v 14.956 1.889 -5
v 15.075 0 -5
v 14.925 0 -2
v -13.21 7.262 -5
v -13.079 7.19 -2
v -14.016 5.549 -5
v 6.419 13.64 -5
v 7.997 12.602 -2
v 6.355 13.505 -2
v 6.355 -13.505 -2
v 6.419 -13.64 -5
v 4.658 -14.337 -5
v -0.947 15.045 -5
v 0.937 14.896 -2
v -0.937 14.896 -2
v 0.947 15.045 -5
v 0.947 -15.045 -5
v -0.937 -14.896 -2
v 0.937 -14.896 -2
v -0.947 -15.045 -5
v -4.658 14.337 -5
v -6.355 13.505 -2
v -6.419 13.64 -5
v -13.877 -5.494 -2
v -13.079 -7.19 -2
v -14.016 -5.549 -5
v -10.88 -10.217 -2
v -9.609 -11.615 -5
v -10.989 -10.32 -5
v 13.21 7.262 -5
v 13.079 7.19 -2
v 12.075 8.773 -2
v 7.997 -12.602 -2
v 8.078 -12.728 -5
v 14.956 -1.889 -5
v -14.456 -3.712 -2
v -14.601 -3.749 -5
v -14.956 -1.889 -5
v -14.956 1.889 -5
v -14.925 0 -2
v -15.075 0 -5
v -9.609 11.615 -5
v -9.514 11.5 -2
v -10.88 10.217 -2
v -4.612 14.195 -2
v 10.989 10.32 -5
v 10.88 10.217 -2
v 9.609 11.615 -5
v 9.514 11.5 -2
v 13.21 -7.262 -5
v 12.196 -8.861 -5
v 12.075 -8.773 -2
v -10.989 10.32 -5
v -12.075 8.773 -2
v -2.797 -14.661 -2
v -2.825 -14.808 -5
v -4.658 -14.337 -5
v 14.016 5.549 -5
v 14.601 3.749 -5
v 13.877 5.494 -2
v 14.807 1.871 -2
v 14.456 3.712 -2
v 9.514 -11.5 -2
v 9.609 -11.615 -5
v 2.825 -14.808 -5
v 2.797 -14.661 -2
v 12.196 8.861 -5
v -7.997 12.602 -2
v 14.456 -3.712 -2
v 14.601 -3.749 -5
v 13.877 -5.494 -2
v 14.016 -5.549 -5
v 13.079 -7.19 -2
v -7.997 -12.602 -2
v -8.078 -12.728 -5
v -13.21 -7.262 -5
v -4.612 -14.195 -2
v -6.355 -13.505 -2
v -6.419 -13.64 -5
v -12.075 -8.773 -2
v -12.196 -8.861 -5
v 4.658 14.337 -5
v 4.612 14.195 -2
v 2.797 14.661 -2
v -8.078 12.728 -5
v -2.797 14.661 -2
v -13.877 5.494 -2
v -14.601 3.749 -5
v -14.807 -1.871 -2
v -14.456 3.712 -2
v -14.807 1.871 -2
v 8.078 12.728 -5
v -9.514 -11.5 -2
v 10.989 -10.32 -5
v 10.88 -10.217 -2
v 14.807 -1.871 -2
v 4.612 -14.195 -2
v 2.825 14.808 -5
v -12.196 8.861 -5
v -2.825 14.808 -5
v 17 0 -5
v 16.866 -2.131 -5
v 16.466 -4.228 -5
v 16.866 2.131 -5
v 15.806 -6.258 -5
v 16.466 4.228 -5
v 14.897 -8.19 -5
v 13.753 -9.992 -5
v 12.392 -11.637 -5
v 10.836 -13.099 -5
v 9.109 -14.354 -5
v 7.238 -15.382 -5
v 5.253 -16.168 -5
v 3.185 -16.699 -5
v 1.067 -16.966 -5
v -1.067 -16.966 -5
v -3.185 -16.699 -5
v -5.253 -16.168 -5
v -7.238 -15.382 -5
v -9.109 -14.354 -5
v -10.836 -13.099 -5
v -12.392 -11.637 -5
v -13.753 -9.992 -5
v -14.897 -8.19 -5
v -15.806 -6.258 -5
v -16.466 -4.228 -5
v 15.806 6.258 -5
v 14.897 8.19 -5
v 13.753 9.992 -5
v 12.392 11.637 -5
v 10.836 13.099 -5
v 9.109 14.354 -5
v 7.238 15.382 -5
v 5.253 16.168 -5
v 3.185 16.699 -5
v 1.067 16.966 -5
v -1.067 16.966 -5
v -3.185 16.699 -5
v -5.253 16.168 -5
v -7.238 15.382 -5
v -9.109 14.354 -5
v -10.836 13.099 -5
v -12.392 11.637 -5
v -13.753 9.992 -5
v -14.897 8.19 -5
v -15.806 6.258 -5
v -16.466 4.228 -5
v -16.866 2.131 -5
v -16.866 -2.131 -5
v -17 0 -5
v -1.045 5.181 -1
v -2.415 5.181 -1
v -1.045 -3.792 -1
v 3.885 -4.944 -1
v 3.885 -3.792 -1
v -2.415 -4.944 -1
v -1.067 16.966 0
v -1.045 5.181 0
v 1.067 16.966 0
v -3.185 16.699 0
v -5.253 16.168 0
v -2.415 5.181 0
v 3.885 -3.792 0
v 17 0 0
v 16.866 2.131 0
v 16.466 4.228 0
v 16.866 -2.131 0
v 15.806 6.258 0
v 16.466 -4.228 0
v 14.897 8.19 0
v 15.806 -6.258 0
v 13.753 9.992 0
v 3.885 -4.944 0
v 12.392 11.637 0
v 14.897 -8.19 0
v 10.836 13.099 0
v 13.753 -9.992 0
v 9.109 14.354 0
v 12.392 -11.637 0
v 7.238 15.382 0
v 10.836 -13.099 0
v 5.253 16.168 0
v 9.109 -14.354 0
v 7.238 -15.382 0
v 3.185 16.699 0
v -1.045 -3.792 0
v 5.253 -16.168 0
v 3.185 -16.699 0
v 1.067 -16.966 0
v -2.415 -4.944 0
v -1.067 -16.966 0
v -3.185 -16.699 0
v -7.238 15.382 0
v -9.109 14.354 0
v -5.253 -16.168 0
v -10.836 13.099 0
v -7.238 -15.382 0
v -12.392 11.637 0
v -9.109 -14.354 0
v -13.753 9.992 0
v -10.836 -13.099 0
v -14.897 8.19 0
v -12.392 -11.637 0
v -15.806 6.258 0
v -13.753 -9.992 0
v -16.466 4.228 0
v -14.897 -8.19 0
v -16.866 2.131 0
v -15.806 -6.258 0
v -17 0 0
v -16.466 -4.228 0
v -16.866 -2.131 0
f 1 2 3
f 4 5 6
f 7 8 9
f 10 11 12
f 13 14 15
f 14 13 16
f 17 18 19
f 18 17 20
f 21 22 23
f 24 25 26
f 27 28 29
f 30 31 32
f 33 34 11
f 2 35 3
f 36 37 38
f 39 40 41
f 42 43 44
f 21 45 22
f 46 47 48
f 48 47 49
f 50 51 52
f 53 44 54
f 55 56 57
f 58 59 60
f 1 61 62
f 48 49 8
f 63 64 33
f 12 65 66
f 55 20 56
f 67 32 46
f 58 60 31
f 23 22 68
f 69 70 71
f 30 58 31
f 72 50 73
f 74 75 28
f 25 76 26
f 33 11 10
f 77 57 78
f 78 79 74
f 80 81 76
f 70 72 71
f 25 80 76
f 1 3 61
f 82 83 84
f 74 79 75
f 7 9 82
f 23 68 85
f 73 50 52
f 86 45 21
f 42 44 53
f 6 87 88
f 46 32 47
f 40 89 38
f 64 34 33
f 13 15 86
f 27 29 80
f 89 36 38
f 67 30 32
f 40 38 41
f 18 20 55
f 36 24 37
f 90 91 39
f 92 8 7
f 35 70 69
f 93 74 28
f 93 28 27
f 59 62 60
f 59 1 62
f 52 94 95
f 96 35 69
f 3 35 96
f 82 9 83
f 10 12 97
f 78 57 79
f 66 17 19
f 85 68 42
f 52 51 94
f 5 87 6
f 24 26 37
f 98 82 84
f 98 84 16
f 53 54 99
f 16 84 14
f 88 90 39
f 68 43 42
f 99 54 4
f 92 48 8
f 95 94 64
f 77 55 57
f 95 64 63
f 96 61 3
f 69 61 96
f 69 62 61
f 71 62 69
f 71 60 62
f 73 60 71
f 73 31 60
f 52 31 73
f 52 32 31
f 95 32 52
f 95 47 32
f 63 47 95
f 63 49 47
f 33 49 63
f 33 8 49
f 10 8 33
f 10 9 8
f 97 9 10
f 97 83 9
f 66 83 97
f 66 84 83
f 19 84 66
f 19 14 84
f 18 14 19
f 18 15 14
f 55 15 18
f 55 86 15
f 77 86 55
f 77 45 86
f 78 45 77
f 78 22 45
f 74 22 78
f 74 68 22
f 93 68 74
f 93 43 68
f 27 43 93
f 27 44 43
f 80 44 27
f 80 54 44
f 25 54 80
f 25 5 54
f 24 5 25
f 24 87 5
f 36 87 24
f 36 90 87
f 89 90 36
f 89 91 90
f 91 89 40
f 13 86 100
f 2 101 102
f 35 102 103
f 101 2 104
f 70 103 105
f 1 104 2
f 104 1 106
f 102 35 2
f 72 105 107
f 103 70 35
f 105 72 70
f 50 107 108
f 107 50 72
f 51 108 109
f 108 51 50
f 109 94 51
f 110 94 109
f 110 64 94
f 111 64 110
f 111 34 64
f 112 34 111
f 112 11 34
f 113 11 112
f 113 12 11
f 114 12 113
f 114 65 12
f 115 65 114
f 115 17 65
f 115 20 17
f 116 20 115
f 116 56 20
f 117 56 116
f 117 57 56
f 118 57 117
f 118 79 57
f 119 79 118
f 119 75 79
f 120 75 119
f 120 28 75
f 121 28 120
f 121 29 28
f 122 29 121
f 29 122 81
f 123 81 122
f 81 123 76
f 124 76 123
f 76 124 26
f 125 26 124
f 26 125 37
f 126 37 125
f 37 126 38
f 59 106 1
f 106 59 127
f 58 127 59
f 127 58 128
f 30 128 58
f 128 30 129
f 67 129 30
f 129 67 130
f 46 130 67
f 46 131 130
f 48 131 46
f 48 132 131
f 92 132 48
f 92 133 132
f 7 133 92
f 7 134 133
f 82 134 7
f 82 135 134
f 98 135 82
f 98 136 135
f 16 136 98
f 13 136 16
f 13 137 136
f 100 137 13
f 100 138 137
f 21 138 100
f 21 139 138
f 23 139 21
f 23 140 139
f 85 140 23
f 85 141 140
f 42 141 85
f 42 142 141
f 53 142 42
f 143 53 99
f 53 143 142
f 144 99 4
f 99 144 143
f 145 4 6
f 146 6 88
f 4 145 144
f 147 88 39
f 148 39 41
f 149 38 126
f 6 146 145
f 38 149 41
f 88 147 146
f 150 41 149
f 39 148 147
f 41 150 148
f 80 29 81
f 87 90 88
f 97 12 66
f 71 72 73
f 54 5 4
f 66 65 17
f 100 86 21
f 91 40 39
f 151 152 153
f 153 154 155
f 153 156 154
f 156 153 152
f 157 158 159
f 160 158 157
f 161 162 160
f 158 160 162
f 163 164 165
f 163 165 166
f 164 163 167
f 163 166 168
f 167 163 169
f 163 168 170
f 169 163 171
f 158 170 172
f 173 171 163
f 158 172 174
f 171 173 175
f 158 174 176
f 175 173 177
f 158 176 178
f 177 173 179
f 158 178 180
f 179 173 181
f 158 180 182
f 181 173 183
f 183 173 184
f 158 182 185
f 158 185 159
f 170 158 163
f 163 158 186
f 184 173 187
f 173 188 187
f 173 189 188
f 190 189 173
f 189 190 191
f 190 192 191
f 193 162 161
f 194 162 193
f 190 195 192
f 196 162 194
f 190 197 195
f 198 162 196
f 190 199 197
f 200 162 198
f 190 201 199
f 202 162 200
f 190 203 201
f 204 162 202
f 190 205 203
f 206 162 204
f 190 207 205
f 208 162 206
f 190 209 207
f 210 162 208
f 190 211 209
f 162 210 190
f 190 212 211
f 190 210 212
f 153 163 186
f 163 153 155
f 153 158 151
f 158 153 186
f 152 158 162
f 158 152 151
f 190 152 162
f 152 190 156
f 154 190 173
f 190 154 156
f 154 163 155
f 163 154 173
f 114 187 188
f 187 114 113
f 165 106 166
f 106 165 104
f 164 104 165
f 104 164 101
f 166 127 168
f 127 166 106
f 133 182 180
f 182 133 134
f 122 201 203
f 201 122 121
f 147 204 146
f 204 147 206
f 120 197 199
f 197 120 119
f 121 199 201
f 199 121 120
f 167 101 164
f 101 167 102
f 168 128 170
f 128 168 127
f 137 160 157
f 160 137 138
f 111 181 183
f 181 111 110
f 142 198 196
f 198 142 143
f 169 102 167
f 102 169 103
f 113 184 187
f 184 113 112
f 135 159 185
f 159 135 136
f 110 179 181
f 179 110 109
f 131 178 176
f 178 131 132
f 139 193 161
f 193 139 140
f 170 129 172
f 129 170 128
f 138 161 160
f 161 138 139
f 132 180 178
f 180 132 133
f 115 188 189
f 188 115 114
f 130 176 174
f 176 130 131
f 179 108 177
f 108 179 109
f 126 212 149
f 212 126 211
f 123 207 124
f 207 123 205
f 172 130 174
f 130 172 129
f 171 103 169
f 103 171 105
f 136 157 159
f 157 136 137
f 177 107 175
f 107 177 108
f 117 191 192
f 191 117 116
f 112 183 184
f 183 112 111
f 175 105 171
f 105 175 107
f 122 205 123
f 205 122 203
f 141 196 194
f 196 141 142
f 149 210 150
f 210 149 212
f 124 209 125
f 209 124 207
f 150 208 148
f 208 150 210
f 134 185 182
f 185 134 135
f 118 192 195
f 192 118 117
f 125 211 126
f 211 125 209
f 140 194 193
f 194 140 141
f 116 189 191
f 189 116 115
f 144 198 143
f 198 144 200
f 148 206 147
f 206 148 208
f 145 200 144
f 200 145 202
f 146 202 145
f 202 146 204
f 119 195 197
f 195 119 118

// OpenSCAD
$fn = 50;


difference() {
	union() {
		translate(v = [0, 0, -5.0000000000]) {
			cylinder(h = 5, r = 17.0000000000);
		}
	}
	union() {
		#translate(v = [0, 0, -5.0000000000]) {
			cylinder(h = 3, r1 = 15.0750000000, r2 = 14.9250000000);
		}
		translate(v = [0, 0, -1]) {
			linear_extrude(height = 1) {
				text(font = "Impact", halign = "center", size = 10, text = "L", valign = "center");
			}
		}
	}
}
